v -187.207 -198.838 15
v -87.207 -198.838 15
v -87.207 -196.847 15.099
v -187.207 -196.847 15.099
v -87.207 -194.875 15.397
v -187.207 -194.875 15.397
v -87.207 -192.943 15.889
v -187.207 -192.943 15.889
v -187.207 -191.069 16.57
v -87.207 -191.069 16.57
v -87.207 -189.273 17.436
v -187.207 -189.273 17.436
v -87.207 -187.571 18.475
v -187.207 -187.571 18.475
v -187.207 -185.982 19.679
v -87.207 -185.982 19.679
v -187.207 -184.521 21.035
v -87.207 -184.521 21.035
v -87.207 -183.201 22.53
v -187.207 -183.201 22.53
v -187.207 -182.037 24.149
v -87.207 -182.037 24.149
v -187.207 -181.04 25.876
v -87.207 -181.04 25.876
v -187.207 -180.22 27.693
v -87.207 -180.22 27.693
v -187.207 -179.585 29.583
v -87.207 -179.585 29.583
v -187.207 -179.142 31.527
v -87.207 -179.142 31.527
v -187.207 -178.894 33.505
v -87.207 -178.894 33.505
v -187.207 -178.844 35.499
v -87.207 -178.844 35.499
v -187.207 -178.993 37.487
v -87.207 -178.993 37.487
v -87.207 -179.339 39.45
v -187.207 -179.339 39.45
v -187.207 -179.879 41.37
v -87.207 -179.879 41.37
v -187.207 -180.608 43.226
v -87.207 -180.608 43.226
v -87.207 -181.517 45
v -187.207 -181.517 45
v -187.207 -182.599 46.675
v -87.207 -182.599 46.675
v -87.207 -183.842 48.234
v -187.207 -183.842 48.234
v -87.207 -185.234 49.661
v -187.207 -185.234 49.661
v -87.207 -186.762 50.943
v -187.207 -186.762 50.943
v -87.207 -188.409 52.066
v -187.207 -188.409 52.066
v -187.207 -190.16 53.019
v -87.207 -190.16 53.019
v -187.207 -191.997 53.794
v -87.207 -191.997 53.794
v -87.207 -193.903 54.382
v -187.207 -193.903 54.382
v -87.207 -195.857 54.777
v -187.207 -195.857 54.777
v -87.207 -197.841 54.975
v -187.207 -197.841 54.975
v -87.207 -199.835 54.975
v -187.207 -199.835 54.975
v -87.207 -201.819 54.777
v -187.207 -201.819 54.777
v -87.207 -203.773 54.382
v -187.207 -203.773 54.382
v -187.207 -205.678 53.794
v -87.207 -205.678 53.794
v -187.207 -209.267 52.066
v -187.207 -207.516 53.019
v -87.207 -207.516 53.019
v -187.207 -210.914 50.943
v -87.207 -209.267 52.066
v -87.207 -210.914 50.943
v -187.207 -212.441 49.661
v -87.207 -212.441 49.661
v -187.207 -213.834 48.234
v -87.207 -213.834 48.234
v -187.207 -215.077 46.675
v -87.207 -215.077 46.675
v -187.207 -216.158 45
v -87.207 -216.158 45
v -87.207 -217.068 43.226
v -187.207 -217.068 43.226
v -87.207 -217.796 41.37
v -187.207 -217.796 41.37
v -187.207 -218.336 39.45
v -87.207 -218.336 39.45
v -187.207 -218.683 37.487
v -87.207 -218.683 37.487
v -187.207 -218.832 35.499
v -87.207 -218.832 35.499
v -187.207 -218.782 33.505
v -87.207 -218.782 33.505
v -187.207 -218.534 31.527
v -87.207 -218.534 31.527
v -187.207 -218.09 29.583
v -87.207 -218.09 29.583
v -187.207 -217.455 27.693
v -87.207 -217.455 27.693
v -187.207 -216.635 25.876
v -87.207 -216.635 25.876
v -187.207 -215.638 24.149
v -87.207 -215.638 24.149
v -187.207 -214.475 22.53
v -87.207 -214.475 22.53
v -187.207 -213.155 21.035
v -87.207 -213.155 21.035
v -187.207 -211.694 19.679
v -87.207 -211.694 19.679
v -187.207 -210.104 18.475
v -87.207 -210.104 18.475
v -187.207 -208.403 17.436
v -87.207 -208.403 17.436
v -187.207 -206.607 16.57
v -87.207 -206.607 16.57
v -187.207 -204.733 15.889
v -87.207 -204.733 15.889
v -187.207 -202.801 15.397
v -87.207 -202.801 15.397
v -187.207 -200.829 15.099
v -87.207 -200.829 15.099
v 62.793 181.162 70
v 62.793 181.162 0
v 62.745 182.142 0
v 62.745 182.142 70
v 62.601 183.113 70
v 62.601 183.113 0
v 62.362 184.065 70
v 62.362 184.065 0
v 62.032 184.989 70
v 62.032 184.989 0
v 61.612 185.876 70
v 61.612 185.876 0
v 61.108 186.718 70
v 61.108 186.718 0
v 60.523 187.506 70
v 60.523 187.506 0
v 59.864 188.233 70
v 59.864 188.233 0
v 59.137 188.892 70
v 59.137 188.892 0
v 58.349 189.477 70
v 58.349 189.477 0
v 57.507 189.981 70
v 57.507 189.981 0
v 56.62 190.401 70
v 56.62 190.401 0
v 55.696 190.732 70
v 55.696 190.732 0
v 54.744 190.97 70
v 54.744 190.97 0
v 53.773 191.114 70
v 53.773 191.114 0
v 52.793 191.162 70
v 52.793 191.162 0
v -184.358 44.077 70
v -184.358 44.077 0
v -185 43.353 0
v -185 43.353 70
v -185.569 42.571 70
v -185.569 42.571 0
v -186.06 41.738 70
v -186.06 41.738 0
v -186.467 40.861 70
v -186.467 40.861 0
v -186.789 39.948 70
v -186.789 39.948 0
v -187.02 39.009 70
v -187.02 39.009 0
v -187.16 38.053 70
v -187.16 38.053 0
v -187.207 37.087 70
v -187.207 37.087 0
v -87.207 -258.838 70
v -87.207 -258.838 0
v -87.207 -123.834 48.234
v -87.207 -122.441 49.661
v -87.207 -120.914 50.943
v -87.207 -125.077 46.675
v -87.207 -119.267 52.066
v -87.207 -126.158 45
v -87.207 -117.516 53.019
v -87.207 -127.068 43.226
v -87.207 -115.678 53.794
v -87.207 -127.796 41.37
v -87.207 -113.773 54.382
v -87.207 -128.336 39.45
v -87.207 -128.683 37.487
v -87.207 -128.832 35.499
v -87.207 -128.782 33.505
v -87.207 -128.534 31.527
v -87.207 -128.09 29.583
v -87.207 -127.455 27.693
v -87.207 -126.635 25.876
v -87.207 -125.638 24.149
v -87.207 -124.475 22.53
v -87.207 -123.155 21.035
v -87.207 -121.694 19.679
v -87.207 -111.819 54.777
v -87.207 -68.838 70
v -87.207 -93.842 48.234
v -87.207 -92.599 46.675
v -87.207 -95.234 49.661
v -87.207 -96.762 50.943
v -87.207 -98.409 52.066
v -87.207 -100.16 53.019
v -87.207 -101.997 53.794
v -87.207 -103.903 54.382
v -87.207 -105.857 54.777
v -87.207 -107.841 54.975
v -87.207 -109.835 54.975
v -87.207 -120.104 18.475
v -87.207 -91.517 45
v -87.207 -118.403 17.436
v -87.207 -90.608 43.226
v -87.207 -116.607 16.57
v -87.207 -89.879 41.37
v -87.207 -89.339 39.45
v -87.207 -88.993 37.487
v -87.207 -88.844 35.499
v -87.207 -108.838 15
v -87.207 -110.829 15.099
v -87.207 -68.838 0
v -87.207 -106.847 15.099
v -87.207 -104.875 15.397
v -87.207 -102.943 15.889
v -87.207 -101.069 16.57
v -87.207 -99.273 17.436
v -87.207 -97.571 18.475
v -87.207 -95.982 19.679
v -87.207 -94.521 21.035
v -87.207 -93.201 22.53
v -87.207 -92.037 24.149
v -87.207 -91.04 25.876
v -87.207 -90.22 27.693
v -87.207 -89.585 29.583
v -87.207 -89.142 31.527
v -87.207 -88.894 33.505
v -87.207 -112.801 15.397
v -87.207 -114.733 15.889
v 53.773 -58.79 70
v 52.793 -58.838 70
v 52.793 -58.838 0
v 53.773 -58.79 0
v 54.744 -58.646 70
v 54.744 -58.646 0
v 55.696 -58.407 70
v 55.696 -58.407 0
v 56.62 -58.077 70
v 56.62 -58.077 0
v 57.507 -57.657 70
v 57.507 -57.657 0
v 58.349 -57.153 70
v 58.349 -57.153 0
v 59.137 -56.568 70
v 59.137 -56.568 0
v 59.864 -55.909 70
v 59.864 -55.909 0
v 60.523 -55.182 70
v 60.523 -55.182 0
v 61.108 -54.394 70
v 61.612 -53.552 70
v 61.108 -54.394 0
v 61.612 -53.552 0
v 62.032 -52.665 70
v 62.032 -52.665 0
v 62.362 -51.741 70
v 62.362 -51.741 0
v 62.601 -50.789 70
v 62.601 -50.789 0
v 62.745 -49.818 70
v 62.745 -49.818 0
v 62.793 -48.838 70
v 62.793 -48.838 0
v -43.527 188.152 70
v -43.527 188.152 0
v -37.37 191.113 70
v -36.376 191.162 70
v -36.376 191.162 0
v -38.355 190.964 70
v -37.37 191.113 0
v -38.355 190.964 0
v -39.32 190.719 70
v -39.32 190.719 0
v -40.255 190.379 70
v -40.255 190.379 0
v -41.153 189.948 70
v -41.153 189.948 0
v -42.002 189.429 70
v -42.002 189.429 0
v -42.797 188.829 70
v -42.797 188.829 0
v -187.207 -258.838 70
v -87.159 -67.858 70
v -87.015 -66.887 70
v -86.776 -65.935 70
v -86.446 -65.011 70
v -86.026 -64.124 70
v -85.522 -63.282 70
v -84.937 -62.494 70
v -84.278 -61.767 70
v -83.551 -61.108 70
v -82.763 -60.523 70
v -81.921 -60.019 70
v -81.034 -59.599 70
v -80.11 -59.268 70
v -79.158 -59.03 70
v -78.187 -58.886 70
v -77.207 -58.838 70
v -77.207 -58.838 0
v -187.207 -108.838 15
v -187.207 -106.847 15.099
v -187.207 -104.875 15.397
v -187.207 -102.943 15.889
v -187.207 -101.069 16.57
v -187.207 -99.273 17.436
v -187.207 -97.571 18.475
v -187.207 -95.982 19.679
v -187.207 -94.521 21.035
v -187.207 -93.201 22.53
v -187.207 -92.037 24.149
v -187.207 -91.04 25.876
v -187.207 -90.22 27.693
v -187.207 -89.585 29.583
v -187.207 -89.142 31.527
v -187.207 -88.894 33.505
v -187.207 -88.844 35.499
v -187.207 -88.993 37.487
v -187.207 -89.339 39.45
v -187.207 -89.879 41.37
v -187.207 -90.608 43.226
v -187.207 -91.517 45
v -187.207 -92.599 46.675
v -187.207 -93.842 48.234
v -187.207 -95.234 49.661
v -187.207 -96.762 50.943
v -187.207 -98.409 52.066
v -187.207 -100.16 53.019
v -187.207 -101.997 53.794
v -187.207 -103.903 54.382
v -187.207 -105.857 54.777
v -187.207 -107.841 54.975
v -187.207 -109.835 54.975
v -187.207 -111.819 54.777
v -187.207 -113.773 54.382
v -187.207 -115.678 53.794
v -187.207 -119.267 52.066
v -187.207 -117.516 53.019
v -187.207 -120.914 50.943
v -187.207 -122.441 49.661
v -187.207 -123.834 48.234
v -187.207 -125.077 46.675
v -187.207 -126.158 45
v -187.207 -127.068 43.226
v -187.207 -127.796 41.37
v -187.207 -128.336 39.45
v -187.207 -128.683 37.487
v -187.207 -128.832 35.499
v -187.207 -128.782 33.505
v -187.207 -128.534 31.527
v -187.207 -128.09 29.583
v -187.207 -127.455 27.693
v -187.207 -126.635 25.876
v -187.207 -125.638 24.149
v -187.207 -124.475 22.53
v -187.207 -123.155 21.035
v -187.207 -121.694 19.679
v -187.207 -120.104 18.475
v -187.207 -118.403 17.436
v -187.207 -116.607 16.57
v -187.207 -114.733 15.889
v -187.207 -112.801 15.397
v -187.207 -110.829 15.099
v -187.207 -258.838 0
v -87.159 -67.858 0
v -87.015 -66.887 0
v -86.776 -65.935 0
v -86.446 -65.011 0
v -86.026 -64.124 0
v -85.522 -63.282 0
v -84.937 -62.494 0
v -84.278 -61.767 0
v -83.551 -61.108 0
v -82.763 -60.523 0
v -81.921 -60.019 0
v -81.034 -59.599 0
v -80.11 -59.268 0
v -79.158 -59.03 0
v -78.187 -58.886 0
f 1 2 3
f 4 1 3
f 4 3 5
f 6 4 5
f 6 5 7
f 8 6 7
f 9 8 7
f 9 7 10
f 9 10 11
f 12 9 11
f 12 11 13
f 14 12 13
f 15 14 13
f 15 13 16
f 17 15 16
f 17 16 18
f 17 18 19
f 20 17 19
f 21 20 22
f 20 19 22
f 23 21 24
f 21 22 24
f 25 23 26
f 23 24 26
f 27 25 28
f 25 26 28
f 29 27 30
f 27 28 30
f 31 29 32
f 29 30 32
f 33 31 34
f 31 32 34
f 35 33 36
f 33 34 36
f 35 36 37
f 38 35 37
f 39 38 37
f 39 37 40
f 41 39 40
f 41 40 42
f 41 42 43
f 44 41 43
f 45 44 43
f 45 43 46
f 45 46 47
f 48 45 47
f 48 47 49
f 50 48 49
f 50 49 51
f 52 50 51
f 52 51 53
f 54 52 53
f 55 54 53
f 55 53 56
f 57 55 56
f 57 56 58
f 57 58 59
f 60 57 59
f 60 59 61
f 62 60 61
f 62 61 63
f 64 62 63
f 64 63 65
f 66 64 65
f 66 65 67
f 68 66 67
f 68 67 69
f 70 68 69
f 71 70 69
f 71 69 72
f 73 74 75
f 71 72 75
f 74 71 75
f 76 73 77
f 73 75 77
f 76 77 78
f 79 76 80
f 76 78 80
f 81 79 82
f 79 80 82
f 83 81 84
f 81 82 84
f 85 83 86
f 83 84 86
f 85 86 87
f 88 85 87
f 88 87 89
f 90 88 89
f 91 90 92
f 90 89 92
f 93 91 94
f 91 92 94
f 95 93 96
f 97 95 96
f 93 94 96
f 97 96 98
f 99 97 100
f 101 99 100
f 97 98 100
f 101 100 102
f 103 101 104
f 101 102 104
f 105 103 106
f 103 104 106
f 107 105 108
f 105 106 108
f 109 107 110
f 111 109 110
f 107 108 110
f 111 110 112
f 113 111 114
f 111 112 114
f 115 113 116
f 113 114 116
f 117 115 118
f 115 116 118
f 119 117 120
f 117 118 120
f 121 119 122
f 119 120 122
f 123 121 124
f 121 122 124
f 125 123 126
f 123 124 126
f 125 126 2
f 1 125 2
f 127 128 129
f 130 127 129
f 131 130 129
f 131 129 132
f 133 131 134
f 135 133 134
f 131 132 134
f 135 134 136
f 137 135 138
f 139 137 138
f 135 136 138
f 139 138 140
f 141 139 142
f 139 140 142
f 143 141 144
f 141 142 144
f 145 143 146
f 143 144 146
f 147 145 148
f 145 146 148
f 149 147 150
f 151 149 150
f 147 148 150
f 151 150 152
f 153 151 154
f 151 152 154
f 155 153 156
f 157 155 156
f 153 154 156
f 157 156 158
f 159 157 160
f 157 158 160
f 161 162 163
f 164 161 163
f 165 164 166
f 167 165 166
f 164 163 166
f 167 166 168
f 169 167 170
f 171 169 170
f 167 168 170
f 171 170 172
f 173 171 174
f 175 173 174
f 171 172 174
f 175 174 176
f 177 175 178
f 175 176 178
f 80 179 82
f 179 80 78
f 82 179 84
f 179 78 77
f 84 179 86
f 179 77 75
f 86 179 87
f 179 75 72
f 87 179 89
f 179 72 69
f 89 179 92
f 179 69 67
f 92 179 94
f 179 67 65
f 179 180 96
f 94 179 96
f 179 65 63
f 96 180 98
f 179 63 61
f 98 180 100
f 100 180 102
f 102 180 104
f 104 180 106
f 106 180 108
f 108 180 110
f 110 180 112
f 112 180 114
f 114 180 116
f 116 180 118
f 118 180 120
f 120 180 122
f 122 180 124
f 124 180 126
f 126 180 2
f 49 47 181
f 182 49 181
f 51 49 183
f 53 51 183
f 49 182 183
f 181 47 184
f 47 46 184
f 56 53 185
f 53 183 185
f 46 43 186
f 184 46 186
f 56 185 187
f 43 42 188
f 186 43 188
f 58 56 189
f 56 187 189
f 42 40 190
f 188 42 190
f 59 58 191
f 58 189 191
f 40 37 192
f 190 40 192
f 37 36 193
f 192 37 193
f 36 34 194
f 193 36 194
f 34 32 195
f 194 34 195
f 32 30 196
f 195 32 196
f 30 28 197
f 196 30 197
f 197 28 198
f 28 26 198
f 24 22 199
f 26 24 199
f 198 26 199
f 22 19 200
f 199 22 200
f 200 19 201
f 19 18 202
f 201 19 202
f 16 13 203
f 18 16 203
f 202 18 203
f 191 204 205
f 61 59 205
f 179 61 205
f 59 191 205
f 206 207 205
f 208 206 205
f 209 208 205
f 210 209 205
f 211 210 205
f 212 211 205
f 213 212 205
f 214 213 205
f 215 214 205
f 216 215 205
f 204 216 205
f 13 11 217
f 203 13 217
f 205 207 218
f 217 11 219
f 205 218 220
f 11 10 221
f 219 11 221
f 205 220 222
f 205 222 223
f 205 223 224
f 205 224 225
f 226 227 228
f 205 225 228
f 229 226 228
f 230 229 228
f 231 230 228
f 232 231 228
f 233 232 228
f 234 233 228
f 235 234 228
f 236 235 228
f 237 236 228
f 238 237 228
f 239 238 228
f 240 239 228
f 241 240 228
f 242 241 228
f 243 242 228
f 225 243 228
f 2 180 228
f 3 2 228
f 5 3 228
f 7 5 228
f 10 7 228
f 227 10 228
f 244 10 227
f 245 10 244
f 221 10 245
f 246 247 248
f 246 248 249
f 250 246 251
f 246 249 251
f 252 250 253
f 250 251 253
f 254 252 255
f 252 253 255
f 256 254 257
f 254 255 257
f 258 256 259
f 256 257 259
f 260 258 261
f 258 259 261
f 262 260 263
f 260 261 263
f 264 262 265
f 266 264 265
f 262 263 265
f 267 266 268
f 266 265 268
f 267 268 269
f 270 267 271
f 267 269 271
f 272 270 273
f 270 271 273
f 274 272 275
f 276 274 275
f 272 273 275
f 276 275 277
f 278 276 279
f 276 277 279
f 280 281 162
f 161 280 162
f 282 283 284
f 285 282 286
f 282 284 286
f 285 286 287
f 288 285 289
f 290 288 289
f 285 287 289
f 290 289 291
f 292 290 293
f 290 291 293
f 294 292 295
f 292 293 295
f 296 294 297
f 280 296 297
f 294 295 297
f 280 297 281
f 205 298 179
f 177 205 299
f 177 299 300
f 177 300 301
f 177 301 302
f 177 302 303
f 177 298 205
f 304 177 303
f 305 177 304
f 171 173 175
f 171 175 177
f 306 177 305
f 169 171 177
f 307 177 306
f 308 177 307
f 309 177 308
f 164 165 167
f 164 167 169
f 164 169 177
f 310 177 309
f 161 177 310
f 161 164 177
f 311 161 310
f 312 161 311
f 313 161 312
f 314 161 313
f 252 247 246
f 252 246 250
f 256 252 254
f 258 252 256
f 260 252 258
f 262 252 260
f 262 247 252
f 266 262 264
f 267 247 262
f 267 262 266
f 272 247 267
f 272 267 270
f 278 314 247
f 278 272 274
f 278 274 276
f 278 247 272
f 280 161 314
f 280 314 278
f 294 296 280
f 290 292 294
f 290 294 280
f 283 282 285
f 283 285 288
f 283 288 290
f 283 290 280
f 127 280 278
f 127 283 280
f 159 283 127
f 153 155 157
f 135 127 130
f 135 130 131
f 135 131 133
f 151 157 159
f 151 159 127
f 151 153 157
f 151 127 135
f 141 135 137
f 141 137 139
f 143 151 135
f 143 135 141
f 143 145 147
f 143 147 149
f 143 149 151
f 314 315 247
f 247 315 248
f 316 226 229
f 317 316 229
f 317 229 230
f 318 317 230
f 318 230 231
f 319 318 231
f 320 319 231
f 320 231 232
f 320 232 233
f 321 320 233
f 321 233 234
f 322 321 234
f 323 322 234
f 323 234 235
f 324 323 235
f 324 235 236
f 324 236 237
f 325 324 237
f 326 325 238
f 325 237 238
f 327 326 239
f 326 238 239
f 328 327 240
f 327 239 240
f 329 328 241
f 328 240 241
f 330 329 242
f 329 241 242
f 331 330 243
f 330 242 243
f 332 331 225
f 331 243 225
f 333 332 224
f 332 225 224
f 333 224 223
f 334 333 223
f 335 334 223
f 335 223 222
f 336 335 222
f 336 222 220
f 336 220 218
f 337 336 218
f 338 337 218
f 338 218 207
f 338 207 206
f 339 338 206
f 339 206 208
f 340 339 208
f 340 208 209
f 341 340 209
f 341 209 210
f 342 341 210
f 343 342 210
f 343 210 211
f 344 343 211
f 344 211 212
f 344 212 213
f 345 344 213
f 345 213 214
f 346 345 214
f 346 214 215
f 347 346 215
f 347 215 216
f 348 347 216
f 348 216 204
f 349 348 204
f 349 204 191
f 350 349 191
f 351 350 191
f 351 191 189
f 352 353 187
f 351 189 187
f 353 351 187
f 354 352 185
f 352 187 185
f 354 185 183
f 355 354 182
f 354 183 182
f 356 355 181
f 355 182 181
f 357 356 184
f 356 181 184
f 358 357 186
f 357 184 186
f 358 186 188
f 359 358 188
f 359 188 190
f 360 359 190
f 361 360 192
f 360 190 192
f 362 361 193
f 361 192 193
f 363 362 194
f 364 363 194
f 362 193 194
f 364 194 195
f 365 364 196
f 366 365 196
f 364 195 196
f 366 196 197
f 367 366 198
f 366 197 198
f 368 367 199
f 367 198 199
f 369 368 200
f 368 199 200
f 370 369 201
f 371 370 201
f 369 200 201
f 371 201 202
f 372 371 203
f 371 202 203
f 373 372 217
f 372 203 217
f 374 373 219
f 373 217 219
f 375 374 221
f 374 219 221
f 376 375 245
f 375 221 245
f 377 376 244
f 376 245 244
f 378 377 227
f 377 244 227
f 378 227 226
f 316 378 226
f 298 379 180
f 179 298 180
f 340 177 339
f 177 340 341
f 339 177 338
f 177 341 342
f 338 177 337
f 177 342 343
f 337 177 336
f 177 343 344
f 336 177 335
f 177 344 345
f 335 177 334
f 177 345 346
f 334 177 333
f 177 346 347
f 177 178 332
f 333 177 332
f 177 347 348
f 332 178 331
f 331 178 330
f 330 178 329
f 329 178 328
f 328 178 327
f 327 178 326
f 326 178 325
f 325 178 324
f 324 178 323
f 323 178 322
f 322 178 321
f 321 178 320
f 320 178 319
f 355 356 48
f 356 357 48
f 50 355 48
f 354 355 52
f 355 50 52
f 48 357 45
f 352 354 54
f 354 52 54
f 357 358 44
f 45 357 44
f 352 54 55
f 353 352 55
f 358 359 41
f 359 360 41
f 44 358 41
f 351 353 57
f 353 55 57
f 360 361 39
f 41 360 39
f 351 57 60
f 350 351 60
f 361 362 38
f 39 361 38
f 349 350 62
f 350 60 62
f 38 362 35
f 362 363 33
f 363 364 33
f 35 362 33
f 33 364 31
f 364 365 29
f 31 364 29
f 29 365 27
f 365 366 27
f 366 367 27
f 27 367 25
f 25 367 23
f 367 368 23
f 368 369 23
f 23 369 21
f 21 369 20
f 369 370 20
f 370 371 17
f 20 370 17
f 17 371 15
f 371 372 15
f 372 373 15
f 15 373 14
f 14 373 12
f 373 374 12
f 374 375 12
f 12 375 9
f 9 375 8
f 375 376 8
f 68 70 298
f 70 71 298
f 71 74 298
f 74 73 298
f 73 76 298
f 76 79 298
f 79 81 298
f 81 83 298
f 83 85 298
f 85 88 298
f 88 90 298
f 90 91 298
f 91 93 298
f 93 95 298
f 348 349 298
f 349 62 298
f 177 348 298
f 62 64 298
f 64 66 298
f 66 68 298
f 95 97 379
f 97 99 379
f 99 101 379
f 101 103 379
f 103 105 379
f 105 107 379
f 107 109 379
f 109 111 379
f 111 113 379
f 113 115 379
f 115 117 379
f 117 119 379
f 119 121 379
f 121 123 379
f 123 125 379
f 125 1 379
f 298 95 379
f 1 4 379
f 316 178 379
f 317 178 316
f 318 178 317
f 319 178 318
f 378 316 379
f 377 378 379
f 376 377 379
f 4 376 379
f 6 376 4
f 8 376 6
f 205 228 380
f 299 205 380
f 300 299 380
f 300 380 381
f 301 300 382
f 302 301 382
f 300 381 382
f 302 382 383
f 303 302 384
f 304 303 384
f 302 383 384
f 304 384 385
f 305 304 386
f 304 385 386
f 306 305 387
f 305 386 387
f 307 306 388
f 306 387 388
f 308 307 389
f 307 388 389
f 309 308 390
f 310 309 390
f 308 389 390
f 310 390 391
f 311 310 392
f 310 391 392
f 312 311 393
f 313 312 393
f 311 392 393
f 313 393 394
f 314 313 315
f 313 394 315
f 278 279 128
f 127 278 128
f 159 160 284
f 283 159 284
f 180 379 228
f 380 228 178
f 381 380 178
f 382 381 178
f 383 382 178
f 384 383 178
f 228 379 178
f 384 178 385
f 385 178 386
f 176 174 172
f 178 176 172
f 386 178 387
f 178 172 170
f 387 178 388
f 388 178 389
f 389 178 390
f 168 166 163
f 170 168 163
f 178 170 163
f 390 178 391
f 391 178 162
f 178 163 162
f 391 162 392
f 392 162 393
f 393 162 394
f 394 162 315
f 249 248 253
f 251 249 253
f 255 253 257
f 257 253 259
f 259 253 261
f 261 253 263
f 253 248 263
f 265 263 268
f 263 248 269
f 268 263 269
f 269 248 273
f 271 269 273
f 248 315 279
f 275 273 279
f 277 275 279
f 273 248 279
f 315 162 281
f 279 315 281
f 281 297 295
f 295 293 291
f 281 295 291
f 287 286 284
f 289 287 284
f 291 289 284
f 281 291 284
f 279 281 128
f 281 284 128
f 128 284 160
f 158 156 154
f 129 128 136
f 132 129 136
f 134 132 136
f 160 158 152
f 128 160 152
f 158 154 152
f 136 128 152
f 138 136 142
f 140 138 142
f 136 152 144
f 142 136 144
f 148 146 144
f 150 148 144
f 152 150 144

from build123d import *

# Parameters (mm, degrees)
BOSS_EXTRUDE1_DEPTH = 70
SKETCH2_R           = 20
CUT_EXTRUDE1_DEPTH  = 129


with BuildPart() as part:
    # Sketch1 → Boss-Extrude1 (new body)
    with BuildSketch(Plane.XY):
        with BuildLine():
            Line((-187.20703125, 37.086522646), (-187.20703125, -258.837890625))
            Line((-187.20703125, -258.837890625), (-87.20703125, -258.837890625))
            Line((-87.20703125, -258.837890625), (-87.20703125, -68.837890625))
            ThreePointArc((-87.20703125, -68.837890625), (-84.278099062, -61.766822813), (-77.20703125, -58.837890625))
            Line((-77.20703125, -58.837890625), (52.79296875, -58.837890625))
            ThreePointArc((52.79296875, -58.837890625), (59.864036562, -55.908958437), (62.79296875, -48.837890625))
            Line((62.79296875, -48.837890625), (62.79296875, 181.162109375))
            ThreePointArc((62.79296875, 181.162109375), (59.864036562, 188.233177187), (52.79296875, 191.162109375))
            Line((52.79296875, 191.162109375), (-36.375896467, 191.162109375))
            ThreePointArc((-36.375896467, 191.162109375), (-40.255270839, 190.378966458), (-43.527024298, 188.152200272))
            Line((-43.527024298, 188.152200272), (-184.35815908, 44.076613543))
            ThreePointArc((-184.35815908, 44.076613543), (-186.467465319, 40.860692866), (-187.20703125, 37.086522646))
        make_face()
    extrude(amount=BOSS_EXTRUDE1_DEPTH)

    # Sketch2 → Cut-Extrude1 (cut)
    with BuildSketch(Plane(origin=(-87.20703125, 0, 0), x_dir=(0, 0, -1), z_dir=(1, 0, 0))):
        with Locations((-35, -108.837890625)):
            Circle(SKETCH2_R)
        with Locations((-35, -198.837890625)):
            Circle(SKETCH2_R)
    extrude(amount=-CUT_EXTRUDE1_DEPTH, mode=Mode.SUBTRACT)


solid = part.part
